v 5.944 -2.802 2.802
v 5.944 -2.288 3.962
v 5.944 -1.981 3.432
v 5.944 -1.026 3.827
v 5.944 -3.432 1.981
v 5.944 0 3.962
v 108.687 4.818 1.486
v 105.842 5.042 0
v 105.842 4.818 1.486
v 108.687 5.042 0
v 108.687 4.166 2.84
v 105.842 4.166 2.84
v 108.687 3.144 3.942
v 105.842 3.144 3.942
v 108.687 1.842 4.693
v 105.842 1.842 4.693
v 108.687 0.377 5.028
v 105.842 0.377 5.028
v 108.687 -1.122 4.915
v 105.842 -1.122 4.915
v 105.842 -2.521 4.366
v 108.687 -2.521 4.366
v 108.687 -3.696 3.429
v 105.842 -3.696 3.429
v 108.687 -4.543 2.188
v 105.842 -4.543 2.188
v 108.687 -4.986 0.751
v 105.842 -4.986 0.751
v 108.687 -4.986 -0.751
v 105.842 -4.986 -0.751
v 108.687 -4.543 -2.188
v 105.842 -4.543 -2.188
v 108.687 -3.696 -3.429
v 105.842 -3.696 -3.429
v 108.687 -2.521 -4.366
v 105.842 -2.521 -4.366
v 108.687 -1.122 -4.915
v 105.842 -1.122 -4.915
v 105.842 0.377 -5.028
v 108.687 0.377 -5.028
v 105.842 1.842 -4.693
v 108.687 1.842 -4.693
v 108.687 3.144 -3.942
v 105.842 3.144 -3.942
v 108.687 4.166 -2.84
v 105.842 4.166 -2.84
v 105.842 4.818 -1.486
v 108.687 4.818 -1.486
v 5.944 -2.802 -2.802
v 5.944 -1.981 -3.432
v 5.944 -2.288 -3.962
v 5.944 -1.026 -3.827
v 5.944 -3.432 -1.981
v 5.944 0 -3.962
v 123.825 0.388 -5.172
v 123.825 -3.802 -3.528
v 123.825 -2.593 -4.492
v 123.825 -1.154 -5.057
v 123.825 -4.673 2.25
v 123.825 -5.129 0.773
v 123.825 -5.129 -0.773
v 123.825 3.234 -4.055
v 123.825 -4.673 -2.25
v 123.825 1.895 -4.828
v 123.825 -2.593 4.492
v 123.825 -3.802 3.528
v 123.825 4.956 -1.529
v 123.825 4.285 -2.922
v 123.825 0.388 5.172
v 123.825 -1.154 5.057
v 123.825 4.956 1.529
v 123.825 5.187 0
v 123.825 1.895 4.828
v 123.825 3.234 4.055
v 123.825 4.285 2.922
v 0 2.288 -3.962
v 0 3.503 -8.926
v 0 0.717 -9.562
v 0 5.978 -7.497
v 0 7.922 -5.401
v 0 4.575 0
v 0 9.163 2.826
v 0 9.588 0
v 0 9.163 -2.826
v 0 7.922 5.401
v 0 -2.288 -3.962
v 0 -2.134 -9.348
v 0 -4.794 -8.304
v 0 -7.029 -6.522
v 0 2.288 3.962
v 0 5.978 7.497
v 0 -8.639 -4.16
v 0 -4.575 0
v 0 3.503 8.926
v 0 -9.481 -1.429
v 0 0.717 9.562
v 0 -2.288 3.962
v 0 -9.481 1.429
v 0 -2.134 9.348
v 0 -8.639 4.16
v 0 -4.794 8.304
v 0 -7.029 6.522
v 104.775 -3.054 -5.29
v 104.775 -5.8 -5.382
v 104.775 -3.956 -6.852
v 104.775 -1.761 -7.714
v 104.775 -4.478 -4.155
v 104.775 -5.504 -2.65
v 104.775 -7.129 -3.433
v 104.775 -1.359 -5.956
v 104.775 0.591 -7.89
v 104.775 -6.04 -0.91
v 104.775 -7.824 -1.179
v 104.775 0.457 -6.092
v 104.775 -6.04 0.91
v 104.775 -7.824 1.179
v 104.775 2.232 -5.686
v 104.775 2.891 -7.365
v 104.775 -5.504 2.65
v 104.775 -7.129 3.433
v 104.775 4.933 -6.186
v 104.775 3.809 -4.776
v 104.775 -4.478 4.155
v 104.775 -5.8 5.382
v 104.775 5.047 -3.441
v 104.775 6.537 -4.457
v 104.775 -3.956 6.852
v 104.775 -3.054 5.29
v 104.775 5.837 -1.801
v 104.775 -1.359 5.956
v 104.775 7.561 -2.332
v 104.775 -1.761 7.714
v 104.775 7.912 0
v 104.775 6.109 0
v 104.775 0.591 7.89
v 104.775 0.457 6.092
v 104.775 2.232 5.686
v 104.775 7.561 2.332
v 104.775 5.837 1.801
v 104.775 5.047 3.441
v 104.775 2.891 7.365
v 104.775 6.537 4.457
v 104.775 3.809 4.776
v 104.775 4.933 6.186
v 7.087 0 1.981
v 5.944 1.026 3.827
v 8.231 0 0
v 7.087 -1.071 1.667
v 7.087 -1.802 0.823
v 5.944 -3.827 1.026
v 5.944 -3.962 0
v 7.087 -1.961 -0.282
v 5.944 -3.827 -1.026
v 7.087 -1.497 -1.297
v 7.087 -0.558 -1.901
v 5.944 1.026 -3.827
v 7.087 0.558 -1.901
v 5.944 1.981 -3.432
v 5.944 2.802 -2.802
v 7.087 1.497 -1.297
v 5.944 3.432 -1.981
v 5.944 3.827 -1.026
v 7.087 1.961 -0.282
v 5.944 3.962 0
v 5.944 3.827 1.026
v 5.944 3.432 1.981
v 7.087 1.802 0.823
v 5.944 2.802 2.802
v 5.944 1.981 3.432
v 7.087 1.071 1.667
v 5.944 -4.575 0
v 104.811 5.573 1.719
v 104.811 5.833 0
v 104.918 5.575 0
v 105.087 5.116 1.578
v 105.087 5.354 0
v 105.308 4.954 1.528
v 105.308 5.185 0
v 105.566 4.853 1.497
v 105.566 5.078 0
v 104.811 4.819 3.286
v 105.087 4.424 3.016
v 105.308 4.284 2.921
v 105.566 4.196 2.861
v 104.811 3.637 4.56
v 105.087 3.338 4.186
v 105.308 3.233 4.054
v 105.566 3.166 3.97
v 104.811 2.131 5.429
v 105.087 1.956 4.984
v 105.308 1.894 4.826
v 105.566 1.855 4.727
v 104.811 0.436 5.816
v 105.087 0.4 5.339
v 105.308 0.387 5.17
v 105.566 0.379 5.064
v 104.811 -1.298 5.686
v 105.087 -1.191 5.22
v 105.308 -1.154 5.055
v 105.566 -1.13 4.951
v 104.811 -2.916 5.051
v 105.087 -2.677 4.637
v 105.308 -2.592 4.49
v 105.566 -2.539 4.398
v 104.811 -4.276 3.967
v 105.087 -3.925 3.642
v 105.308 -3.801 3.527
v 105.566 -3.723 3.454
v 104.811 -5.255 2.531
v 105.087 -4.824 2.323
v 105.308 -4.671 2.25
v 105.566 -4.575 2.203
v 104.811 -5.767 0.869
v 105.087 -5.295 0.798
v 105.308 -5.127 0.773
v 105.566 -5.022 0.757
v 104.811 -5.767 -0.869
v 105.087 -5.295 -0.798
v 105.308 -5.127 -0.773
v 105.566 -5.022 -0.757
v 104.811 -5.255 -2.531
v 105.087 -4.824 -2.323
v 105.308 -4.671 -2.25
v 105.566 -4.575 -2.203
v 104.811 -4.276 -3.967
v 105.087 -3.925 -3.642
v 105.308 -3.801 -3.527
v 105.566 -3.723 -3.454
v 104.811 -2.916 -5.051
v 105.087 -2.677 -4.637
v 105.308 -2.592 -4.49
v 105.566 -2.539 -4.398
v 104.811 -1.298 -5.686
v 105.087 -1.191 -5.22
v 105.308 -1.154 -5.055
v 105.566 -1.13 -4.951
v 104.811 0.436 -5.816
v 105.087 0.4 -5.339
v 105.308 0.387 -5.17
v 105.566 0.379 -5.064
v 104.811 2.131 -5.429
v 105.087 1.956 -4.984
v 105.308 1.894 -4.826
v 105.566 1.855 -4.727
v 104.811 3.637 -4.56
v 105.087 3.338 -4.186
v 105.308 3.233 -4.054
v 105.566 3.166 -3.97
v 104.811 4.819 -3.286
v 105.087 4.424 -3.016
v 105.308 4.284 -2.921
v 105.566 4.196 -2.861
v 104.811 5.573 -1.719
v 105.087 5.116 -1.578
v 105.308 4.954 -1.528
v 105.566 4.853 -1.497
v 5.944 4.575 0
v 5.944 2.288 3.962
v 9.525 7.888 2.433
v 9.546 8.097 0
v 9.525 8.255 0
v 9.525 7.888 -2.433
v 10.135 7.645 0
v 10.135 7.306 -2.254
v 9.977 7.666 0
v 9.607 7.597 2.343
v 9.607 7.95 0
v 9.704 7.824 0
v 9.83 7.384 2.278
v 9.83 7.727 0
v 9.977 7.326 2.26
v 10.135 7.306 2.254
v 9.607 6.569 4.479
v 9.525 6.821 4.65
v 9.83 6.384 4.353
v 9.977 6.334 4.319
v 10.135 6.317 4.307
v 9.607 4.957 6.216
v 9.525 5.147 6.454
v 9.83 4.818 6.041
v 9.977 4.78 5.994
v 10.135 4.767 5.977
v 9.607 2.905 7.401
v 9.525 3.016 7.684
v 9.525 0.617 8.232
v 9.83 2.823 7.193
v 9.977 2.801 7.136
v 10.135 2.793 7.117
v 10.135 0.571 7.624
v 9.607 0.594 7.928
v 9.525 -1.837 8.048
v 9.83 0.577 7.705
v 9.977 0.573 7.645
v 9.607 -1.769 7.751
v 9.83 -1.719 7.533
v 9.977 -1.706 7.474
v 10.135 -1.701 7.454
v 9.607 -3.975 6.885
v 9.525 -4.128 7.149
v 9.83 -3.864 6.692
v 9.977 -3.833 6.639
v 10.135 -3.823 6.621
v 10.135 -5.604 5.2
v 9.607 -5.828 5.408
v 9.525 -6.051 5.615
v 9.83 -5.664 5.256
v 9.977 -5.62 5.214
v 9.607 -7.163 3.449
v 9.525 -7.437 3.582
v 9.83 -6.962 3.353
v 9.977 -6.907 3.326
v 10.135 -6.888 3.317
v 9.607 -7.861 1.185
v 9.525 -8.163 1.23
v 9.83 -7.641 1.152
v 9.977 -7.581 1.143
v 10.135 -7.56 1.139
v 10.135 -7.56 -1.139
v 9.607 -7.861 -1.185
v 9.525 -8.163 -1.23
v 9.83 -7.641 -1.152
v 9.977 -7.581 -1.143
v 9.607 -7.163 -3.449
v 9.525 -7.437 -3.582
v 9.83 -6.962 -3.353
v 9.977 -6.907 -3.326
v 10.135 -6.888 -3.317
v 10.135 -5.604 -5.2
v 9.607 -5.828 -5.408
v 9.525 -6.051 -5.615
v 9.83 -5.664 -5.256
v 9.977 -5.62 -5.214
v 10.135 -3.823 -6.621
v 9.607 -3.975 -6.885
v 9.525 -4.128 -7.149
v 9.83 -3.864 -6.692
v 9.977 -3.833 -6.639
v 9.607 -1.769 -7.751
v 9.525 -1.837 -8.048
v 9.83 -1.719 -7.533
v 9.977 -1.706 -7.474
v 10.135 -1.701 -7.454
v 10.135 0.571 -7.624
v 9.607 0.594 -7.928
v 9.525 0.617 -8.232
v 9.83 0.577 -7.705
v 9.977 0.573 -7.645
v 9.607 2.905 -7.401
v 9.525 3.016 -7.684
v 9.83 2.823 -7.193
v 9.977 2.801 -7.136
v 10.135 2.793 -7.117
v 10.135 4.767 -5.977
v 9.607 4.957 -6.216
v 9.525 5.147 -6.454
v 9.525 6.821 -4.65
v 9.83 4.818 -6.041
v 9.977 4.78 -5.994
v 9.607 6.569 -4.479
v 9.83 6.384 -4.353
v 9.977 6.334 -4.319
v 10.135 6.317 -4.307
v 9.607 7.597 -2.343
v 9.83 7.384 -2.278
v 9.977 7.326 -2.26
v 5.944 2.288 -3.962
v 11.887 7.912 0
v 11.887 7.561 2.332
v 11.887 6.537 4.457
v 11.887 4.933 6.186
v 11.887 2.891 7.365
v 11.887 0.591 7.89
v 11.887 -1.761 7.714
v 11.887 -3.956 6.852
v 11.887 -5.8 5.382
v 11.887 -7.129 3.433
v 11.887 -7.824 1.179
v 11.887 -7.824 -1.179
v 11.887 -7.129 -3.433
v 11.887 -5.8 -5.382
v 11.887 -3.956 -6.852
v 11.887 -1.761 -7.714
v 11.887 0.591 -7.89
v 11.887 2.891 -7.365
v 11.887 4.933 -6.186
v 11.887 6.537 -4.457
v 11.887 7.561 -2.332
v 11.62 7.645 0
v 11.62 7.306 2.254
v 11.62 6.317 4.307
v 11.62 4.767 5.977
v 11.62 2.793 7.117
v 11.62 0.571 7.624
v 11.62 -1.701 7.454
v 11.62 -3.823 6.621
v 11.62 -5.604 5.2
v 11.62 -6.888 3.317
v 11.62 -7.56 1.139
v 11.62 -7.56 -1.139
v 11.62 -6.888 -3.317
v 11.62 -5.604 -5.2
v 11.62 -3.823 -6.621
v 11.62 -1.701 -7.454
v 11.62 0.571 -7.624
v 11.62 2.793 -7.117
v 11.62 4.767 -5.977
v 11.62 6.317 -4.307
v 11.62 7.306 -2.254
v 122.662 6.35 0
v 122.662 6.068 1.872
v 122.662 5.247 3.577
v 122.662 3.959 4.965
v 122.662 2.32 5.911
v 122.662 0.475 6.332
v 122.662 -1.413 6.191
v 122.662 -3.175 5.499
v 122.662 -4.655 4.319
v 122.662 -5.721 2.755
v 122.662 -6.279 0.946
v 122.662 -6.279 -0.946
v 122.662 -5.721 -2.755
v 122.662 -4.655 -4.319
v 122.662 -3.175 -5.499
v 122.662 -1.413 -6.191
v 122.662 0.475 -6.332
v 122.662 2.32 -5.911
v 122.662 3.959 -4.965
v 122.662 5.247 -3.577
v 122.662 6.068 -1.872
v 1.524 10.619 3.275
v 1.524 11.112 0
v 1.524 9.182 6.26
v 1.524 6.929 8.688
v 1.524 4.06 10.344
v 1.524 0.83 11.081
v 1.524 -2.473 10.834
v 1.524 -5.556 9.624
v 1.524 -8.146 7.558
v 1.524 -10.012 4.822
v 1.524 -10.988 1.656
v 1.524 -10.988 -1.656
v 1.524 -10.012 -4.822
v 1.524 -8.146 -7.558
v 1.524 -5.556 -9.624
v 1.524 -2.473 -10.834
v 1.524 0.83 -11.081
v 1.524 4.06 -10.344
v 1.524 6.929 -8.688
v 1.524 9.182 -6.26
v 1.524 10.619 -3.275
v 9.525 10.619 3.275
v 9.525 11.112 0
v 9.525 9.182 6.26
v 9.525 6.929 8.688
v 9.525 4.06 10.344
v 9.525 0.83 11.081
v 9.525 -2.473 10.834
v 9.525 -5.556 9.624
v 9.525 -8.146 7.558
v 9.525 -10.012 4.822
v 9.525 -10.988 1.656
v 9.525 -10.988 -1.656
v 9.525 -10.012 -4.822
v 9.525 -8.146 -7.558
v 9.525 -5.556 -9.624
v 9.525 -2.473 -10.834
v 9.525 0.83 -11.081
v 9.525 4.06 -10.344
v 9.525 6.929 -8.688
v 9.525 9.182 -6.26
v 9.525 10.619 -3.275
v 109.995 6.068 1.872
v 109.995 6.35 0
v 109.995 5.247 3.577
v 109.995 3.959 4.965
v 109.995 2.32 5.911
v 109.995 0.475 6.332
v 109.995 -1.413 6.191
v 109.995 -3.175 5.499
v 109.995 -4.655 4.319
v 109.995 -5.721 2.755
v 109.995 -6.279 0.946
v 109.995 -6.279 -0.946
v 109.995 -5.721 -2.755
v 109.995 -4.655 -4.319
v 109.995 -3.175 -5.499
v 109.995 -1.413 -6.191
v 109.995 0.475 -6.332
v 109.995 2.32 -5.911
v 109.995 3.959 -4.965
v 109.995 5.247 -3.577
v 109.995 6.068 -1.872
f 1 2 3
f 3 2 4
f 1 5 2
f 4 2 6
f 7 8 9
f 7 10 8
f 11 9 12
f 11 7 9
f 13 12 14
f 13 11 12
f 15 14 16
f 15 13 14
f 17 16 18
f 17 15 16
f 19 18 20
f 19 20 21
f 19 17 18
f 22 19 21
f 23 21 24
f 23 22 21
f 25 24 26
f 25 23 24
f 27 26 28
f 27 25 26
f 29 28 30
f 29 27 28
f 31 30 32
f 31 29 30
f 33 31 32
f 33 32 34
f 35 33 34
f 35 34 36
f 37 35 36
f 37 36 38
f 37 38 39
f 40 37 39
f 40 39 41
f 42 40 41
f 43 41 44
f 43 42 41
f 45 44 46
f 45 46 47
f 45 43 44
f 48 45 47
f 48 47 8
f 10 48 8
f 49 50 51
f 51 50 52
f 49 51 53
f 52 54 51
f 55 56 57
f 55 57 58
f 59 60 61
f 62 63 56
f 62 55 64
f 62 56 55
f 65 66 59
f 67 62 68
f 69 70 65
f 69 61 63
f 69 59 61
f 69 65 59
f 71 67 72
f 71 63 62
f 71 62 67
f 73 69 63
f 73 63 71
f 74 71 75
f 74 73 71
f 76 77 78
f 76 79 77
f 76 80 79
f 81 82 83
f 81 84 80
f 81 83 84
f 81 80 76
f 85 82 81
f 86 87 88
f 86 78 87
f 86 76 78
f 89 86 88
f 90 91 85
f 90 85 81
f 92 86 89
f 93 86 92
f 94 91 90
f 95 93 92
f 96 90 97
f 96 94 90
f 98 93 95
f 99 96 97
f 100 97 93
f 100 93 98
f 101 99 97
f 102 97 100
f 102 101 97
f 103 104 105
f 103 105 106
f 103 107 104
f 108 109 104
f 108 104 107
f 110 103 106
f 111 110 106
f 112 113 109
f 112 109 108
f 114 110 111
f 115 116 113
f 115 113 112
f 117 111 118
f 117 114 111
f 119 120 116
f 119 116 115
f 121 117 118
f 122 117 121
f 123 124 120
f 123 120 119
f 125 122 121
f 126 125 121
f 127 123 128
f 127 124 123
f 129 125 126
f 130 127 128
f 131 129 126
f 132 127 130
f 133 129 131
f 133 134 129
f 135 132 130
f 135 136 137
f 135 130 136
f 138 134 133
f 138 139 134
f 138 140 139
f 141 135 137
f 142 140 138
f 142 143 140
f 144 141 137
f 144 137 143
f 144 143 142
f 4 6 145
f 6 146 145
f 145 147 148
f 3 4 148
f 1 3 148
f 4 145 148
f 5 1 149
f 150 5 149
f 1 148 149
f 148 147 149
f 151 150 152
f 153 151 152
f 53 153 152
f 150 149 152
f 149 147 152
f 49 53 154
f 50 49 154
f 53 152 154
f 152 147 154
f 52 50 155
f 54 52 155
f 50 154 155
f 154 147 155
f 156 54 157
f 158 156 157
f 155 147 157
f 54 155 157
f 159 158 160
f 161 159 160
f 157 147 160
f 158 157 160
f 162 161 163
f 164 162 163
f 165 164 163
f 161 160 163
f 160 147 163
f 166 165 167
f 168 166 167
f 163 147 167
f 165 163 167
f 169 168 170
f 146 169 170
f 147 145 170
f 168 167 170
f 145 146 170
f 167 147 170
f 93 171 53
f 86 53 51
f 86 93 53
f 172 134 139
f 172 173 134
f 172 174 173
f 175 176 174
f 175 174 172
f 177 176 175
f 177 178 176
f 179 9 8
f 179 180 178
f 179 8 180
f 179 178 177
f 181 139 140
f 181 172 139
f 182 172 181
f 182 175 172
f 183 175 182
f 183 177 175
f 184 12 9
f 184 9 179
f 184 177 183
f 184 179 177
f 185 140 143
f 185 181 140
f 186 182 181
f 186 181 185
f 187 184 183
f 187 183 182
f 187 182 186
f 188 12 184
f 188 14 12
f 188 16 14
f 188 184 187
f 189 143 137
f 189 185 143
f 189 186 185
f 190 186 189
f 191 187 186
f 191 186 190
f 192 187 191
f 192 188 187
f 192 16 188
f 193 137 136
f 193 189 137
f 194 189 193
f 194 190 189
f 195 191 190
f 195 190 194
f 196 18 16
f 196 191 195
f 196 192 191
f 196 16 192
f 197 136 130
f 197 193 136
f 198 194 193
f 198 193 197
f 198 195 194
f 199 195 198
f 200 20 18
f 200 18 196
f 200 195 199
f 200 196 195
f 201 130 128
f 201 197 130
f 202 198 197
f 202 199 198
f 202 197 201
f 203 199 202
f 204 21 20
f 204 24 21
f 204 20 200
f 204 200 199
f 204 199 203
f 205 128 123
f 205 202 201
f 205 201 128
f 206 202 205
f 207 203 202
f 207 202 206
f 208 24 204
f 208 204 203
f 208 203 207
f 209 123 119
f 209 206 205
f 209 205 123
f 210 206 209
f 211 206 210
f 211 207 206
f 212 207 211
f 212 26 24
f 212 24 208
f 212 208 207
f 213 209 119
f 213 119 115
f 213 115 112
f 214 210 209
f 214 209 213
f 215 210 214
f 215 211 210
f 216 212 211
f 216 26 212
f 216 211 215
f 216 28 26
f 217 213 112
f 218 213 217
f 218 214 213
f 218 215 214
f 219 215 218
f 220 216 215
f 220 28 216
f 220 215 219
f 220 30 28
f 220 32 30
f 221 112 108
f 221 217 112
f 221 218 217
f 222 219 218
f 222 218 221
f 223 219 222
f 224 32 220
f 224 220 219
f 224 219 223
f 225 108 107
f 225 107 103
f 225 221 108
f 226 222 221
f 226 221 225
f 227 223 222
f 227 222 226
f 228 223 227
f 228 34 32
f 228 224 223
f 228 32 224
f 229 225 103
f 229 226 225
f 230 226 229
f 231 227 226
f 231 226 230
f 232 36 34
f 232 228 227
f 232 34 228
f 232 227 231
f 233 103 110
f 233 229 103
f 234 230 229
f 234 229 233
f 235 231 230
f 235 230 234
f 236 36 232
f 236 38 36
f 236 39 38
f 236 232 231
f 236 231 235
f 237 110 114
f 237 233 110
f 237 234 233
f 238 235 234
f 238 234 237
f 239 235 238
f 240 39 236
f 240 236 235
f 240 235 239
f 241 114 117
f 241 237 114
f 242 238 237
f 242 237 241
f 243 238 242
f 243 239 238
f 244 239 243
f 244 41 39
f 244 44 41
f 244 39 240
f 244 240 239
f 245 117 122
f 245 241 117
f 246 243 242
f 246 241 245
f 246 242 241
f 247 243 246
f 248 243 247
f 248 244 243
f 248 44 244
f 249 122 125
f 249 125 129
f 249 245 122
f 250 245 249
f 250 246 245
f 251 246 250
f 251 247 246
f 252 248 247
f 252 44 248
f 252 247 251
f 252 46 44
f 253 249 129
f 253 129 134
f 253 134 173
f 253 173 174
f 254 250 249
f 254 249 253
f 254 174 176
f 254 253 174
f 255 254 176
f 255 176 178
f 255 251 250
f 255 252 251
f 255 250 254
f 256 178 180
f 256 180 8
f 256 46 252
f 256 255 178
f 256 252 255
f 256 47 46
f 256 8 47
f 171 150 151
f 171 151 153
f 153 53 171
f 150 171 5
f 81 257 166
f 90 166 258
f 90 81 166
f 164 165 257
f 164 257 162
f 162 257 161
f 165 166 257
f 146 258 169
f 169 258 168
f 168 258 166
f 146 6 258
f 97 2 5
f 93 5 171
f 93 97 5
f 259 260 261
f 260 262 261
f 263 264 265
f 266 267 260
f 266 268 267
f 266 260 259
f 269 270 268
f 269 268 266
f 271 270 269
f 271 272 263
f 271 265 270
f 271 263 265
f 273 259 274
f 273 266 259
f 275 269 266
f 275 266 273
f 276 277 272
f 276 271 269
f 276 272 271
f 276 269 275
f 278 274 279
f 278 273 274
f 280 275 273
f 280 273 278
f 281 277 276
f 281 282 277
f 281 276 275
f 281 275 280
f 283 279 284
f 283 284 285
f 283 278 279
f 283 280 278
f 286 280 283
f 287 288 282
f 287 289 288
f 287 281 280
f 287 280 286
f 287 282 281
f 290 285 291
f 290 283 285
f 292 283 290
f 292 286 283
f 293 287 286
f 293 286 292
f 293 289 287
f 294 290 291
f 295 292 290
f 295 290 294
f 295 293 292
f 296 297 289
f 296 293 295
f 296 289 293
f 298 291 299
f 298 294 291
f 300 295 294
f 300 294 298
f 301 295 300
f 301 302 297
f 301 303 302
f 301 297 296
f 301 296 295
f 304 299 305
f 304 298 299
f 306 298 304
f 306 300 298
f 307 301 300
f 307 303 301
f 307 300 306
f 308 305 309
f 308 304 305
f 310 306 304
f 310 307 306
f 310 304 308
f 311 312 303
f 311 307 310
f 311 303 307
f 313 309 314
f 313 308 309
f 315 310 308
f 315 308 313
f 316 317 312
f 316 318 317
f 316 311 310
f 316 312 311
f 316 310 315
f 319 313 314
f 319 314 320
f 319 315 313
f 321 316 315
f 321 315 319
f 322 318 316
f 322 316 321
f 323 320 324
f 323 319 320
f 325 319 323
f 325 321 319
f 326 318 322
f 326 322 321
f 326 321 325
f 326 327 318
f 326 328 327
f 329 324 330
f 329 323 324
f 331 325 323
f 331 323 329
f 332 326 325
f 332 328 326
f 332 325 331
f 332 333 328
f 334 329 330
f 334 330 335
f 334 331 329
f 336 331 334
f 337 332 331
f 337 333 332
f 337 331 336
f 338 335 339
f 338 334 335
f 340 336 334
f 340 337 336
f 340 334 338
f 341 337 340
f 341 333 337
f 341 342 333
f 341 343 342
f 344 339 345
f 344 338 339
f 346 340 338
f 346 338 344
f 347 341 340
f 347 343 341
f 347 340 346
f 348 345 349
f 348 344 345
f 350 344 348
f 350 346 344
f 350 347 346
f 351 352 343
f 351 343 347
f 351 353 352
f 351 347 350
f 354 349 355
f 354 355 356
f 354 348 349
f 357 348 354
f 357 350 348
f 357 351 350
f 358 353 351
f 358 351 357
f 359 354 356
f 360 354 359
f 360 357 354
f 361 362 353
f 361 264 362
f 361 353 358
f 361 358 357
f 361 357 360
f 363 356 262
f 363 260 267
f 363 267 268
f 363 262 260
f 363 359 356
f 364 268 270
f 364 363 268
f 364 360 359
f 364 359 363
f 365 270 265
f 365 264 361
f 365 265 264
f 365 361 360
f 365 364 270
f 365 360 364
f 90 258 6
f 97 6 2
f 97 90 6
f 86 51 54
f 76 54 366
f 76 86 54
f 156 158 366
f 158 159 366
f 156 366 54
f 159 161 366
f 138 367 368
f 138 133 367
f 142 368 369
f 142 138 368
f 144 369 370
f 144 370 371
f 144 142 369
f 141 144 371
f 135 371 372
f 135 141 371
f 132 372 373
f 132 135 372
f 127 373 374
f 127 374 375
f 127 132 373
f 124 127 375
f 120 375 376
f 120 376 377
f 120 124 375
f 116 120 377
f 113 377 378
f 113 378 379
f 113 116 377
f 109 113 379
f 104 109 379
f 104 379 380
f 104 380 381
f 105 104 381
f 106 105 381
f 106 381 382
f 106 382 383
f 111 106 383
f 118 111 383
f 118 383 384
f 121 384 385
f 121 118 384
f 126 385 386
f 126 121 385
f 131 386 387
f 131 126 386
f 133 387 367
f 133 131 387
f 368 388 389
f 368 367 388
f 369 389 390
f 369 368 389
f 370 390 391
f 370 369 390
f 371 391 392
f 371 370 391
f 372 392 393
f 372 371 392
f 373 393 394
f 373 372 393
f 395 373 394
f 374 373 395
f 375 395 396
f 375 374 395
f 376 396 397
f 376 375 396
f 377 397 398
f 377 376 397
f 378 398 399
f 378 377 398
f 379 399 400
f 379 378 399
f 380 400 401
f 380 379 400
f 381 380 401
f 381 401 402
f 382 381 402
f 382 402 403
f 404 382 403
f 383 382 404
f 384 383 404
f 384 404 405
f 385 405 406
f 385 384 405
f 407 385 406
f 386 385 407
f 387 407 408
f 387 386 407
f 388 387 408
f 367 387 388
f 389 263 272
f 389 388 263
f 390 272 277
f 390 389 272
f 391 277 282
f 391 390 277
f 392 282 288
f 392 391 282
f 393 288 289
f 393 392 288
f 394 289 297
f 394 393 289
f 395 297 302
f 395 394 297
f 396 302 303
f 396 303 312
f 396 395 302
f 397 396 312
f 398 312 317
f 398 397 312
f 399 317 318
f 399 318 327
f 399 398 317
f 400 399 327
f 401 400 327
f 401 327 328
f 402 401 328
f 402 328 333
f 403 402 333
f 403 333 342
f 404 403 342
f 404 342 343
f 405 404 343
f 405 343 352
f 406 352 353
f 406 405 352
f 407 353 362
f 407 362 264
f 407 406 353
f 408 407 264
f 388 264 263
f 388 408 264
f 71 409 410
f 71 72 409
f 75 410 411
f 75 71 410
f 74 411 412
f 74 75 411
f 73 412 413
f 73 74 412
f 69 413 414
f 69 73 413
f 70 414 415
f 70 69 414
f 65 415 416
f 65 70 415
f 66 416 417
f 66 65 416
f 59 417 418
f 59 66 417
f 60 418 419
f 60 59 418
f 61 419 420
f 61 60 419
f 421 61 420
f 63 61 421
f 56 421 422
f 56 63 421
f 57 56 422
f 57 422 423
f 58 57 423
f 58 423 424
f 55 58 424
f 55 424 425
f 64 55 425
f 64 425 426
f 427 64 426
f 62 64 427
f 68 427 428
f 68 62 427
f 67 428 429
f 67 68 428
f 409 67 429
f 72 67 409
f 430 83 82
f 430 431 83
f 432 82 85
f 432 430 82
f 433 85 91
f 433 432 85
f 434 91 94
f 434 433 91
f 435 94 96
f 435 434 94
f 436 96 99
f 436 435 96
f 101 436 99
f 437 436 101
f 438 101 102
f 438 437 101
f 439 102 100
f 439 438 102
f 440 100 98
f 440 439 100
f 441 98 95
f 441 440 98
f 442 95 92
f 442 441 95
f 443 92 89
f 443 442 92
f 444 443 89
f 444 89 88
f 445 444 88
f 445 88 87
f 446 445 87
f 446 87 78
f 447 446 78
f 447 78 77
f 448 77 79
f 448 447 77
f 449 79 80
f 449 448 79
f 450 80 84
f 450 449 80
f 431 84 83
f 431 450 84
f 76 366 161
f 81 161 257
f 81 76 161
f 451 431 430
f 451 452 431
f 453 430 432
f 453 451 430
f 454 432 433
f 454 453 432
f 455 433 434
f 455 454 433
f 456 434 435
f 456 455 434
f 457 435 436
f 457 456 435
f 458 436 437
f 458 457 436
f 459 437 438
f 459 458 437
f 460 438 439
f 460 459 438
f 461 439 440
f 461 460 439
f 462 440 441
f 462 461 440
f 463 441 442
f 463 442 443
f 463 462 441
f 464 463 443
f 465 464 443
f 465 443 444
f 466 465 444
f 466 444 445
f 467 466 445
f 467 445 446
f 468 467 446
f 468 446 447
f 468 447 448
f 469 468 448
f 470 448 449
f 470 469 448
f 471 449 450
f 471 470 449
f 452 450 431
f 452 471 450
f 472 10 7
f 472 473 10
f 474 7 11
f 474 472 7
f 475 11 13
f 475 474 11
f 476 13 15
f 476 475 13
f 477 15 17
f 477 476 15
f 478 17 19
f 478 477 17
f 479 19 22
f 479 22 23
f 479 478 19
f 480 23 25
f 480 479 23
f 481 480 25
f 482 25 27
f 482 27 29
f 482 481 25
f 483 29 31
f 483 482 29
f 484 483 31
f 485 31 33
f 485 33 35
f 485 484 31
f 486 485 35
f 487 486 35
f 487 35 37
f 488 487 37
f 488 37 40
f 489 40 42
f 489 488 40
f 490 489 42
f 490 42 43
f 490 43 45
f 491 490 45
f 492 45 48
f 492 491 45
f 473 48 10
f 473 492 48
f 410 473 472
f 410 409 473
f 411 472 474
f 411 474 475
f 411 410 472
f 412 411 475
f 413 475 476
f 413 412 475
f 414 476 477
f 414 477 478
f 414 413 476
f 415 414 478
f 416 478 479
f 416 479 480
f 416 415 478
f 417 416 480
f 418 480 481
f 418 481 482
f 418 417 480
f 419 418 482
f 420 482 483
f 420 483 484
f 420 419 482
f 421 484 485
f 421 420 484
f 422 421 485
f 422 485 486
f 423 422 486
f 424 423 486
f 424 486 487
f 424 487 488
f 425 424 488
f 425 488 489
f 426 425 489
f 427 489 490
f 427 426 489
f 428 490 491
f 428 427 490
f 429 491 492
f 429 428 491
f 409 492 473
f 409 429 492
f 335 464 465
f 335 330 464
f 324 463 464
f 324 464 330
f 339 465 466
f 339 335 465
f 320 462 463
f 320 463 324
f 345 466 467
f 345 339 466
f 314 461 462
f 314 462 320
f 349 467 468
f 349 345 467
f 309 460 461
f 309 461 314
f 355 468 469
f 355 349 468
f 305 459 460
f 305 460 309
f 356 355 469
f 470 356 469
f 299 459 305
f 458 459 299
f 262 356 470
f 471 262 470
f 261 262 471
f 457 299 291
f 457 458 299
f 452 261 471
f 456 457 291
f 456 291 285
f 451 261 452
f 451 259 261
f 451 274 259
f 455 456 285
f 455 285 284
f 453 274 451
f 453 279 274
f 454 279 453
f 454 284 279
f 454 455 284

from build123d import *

# Parameters (mm, degrees)
HEX_2_DEPTH = 5.9436


# Read off the part's stored shape, not the designer's step: ThreadSchematic
with BuildPart() as part:
    # ThreadSchematic outline → ThreadSchematic (revolve)
    with BuildSketch(Plane.YX):
        with BuildLine():
            Line((0, 123.825), (0, 0))
            Line((0, 0), (9.5885, 0))
            Line((9.5885, 0), (11.1125, 1.524))
            Line((11.1125, 1.524), (11.1125, 9.525))
            Line((11.1125, 9.525), (8.255, 9.525))
            ThreePointArc((8.255, 9.525), (7.823947706, 9.703547706), (7.6454, 10.1346))
            Line((7.6454, 10.1346), (7.6454, 11.6205))
            Line((7.6454, 11.6205), (7.9121, 11.8872))
            Line((7.9121, 11.8872), (7.9121, 104.775))
            Line((7.9121, 104.775), (6.1087, 104.775))
            ThreePointArc((6.1087, 104.775), (5.354358486, 105.087458486), (5.0419, 105.8418))
            Line((5.0419, 105.8418), (5.0419, 108.6866))
            Line((5.0419, 108.6866), (6.35, 109.9947))
            Line((6.35, 109.9947), (6.35, 122.66168))
            Line((6.35, 122.66168), (5.18668, 123.825))
            Line((5.18668, 123.825), (0, 123.825))
        make_face()
    revolve(axis=Axis((0, 0, 0), (1, 0, 0)))

    # Sketch2 → PreBroach (revolve, cut)
    with BuildSketch(Plane.XY, mode=Mode.PRIVATE) as prebroach_sk:
        Polygon((0, 3.9624), (5.9436, 3.9624), (8.231292707, 0), (0, 0), align=None)
    revolve(prebroach_sk.sketch.rotate(Axis((0, 0, 0), (1, 0, 0)), 90), axis=Axis((0, 0, 0), (1, 0, 0)), mode=Mode.SUBTRACT)

    # Sketch3 → Hex 2 (cut)
    with BuildSketch(Plane.ZY):
        Polygon((-3.9624, -2.287692707), (-3.9624, 2.287692707), (0, 4.575385413), (3.9624, 2.287692707), (3.9624, -2.287692707), (0, -4.575385413), align=None)
    extrude(amount=-HEX_2_DEPTH, mode=Mode.SUBTRACT)


solid = part.part
